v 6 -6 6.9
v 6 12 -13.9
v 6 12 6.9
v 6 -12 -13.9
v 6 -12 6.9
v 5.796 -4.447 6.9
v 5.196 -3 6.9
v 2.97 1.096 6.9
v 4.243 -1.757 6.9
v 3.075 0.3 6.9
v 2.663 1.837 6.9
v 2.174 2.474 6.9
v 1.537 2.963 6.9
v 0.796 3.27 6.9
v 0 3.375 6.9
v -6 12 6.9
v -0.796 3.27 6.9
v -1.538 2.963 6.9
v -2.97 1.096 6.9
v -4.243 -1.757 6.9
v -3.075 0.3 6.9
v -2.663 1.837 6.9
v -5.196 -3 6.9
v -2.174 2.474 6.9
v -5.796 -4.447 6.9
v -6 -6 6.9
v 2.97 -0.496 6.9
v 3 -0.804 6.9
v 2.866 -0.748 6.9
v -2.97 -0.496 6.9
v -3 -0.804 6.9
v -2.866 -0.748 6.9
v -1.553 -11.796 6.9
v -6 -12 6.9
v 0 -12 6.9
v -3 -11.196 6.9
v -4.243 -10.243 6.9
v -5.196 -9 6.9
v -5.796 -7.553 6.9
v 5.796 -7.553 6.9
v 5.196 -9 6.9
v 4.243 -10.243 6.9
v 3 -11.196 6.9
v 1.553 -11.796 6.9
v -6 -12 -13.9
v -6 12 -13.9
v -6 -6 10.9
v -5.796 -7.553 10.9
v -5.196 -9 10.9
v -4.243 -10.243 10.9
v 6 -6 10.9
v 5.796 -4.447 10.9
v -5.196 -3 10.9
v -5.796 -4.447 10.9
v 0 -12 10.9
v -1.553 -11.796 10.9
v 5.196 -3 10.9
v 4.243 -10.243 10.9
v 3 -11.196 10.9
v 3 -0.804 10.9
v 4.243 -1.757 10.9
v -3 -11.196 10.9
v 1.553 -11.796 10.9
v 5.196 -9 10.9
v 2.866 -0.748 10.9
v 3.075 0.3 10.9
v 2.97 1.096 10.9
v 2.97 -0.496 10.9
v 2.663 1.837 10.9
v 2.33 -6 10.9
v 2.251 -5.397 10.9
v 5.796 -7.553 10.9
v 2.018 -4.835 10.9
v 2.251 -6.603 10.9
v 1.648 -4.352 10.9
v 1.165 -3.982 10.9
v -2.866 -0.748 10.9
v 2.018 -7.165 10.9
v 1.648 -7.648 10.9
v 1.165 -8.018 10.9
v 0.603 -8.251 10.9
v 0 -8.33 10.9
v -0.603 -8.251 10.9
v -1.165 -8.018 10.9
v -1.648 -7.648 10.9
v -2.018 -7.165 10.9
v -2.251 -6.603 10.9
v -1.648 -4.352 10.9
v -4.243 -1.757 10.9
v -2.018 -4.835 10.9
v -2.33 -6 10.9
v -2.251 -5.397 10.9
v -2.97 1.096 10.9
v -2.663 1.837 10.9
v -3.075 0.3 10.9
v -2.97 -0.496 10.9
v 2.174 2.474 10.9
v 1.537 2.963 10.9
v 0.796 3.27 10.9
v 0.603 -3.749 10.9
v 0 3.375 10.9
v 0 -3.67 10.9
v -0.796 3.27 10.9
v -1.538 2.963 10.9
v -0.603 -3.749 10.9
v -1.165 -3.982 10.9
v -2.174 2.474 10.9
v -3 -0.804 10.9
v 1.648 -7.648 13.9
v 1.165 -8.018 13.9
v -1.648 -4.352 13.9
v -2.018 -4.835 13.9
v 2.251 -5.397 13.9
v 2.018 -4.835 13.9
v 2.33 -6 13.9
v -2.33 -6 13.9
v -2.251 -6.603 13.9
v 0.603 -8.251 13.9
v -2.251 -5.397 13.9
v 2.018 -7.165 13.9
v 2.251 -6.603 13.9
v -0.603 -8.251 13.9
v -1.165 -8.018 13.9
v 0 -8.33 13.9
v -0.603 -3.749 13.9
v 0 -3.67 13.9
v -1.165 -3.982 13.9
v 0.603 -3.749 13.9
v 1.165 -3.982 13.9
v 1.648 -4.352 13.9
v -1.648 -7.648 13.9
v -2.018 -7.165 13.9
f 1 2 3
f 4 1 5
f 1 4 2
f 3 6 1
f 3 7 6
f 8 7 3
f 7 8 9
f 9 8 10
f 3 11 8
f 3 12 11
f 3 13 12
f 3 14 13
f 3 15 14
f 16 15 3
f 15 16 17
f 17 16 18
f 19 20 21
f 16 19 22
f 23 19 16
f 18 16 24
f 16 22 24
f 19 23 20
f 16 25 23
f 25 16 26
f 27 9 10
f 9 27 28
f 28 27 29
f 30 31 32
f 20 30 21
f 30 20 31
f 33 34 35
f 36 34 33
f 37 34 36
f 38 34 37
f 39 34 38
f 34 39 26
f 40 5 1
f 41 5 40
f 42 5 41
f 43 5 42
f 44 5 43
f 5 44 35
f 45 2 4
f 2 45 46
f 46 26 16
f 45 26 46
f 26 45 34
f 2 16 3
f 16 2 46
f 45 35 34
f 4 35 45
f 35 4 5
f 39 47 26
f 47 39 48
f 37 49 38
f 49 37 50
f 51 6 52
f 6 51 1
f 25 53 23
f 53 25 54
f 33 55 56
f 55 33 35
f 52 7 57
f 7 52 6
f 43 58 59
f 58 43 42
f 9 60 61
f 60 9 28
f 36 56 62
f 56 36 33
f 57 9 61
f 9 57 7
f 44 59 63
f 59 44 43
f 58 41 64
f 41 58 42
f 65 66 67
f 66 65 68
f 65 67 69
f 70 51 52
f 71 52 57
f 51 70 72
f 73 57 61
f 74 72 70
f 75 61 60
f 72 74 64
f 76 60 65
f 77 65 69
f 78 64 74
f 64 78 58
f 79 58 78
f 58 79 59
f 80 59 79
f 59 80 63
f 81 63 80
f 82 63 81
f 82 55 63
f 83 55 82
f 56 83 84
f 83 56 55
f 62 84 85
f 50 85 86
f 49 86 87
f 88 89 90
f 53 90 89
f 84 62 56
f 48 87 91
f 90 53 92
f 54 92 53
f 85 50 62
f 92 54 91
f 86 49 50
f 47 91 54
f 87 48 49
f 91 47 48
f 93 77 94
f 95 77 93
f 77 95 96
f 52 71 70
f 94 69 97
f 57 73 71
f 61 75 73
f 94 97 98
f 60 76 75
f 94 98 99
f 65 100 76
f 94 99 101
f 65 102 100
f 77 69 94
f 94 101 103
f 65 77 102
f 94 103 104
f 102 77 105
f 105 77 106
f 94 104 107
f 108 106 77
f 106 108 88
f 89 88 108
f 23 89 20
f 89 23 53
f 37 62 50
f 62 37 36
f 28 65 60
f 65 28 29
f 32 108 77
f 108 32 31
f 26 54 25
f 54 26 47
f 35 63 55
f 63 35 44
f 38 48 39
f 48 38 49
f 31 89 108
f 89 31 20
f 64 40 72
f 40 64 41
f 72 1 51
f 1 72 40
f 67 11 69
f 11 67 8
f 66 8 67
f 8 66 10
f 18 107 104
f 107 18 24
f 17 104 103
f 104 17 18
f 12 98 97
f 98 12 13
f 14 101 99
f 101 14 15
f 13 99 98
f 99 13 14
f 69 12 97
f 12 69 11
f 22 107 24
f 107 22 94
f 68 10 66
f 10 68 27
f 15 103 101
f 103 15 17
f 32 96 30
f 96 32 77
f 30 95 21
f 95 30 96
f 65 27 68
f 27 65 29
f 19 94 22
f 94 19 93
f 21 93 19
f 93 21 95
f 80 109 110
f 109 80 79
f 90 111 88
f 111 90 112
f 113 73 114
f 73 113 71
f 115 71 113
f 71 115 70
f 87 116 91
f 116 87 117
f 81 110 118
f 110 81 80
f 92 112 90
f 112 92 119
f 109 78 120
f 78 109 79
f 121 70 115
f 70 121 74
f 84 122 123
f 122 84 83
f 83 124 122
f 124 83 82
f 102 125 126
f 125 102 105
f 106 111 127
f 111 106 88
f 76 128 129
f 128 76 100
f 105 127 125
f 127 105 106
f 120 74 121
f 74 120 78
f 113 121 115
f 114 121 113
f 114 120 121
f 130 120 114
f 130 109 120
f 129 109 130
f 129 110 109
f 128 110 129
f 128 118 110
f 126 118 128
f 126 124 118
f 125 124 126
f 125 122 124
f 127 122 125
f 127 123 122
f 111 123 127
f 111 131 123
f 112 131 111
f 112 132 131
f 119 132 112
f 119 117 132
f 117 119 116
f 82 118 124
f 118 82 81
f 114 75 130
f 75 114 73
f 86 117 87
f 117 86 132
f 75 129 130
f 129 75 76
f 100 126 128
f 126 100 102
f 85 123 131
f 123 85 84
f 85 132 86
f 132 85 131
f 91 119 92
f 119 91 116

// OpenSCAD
// file: config.scad
//Parameters for 12g servo
$fn = 24;
//x,y,z => l,w,h

tap_r = 0.85;
hole_r = 1.0;

servo_l         = 12;  // was 12
servo_w         = 24;  // was 23
body_h          = 20.80;

servo_h         = 27; //not used in code was 27

wing_w          = 4.5;
wing_h          = 2.33;
wing_place      = 16.3;   
hole_offset     = 2.2;    //not checked
mount_hole_r    = 2/2;
mount_slot      = 1;

servo_ww        = servo_w+wing_w*2; // not used in code but is handy number

hub_h           = 4;
small_hub_r     = 6.15/2;  
horn_r          = 4.66/2;
horn_h          = 3;

wire_l          = 4;
wire_w          = 1.5;
wire_h          = 1;
wire_place      = 4.8;

servo_full_w    = servo_w+wing_w*2;

rad = 2;




//Parameters for 5g servo

servo5_l         = 8.6; 
servo5_w         = 18.6; 
body5_h          = 14.65;


hub5_h = 2.15;
small_hub5_r = 4.6/2;  
horn5_r = 4.66/2;
horn5_h = 3;

servo5_h         = body5_h+hub5_h+horn5_h;

mount_x = servo5_l + 2;
mount_y = servo5_w + 2;
mount_round = 1;
servo_tol = 0.2;
servo5_x     = servo5_l + servo_tol*2; //~12
servo5_y     = servo5_w + servo_tol*8; //~23
// main file
include <config.scad>


servo_12g();


$fn = 24;
//x,y,z => l,w,h


module servo_12g() {
  
    translate([-servo_l/2, -servo_w/2, -body_h/2-hub_h/2-horn_h/2]) {
    
        color("white") 
        translate([servo_l/2,servo_l/2,body_h+hub_h])
        cylinder(r=horn_r,h=horn_h);
        
        color("deepSkyBlue",.7) //deepSkyBlue
        union() {
            cube([servo_l,servo_w,body_h]);
            translate([servo_l/2,servo_l/2,body_h])
            cylinder(r=servo_l/2,h=hub_h);
            translate([servo_l/2,servo_l/2+6.30,body_h])
            cylinder(r=small_hub_r,h=hub_h);
            
        }
    }
}

module roundedRect(size, radius)
{
x = size[0];
y = size[1];
z = size[2];

translate([x/2+radius/2, y/2+radius/2, 0]){
linear_extrude(height=z)
hull()
{
// place 4 circles in the corners, with the given radius
translate([(-x/2)+(radius/2), (-y/2)+(radius/2), 0])
circle(r=radius);

translate([(x/2)-(radius/2), (-y/2)+(radius/2), 0])
circle(r=radius);

translate([(-x/2)+(radius/2), (y/2)-(radius/2), 0])
circle(r=radius);

translate([(x/2)-(radius/2), (y/2)-(radius/2), 0])
circle(r=radius);
}
}
}
